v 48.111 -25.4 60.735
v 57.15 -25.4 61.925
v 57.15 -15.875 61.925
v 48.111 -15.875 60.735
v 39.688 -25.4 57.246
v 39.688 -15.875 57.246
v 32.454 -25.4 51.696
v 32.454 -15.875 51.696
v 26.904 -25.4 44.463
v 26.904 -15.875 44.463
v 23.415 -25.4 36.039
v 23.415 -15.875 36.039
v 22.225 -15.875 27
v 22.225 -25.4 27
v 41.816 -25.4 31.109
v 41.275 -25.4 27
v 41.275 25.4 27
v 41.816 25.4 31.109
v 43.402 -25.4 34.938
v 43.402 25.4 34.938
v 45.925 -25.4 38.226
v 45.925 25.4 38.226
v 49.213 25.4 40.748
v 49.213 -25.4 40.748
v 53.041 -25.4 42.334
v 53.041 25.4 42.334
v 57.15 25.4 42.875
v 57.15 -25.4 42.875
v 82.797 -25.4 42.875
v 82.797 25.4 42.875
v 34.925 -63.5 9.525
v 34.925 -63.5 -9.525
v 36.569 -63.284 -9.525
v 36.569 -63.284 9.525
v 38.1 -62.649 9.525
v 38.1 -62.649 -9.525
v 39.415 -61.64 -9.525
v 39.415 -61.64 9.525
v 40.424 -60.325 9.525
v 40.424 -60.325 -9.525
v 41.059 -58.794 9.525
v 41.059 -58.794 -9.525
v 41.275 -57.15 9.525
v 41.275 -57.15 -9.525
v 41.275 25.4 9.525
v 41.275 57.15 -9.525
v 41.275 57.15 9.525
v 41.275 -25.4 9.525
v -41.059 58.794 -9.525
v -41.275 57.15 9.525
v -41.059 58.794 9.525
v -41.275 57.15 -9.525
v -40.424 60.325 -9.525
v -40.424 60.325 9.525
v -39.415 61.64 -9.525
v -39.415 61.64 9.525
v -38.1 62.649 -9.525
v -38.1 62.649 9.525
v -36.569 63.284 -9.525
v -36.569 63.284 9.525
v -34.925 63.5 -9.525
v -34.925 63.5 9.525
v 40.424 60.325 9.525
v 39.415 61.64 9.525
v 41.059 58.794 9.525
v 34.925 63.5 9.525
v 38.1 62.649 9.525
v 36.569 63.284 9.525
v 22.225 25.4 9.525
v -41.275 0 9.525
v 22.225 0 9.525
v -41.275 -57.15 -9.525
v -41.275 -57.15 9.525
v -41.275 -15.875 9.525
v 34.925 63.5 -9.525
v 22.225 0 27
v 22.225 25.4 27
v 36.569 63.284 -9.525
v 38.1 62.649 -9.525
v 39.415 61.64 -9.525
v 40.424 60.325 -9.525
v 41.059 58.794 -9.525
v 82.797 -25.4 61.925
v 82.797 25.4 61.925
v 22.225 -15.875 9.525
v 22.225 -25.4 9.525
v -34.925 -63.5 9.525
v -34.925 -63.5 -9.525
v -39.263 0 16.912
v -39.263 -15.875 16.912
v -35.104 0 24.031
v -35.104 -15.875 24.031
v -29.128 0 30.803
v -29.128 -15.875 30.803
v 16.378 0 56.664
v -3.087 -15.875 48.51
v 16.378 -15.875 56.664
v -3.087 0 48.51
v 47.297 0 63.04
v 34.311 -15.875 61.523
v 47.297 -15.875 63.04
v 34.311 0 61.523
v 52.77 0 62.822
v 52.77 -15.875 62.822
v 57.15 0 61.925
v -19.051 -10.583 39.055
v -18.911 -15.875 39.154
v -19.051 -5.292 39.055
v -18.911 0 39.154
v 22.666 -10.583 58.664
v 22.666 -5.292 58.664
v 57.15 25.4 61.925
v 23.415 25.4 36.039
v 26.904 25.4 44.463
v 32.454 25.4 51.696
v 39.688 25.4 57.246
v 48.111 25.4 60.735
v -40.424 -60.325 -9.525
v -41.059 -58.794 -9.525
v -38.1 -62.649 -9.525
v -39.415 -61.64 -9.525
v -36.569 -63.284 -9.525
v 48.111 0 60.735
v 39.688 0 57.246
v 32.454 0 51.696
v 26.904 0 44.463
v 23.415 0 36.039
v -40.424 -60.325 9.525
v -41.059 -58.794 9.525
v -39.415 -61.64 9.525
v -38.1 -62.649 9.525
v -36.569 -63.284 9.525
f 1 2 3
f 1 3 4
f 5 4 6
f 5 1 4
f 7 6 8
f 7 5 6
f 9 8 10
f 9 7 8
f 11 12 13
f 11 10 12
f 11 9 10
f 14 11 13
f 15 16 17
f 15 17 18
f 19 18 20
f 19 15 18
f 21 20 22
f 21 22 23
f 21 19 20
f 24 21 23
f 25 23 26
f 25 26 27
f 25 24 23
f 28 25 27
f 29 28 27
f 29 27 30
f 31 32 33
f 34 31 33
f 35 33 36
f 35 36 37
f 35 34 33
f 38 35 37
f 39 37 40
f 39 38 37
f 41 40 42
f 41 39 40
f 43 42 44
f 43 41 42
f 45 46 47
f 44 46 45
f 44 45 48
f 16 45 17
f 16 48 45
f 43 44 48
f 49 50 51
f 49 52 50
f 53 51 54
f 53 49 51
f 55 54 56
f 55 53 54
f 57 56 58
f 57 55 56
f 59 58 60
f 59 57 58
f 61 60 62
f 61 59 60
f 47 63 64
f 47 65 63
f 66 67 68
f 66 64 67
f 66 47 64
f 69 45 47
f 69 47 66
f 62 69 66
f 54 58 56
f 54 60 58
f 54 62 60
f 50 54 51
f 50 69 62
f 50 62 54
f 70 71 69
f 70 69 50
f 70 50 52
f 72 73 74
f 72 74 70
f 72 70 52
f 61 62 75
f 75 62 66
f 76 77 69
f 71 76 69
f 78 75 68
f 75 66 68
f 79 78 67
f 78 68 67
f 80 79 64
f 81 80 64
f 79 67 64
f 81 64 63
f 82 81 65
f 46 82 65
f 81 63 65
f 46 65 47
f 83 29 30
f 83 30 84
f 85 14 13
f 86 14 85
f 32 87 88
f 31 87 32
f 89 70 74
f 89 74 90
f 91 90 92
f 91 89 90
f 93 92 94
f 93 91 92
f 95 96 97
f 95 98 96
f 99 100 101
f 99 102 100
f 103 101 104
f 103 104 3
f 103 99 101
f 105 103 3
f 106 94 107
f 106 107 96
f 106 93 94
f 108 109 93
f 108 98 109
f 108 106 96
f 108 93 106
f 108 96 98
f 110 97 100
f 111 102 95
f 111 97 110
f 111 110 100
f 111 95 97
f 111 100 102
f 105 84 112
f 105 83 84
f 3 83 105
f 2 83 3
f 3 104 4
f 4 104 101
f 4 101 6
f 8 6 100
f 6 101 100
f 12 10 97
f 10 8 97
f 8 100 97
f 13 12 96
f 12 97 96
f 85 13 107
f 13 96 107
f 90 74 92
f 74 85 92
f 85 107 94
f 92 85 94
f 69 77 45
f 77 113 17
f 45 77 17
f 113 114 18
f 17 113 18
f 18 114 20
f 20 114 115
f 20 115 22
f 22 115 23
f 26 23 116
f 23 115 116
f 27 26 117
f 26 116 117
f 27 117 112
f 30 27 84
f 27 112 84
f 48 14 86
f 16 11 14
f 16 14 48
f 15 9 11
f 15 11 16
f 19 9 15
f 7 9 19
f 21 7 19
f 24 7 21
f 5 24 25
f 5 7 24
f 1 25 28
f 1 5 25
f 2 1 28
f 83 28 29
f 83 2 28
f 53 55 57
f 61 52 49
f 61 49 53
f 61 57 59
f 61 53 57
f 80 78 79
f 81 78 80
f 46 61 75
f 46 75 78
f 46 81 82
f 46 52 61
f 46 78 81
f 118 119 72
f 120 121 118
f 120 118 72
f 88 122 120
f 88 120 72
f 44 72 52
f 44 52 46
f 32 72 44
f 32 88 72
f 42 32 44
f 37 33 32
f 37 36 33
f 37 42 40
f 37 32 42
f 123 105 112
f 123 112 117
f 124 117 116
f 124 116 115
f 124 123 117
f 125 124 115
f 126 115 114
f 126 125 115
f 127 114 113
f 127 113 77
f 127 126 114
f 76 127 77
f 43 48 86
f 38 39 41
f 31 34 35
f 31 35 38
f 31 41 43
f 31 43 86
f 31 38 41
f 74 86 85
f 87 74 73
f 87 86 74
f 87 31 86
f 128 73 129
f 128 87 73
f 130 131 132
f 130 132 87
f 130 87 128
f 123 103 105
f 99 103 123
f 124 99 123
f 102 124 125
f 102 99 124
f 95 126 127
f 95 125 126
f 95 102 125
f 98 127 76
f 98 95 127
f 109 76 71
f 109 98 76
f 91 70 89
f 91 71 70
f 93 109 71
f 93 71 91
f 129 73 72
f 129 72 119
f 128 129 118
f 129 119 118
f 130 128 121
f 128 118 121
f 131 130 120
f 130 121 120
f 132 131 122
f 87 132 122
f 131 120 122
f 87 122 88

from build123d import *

# Parameters (mm, degrees)
F1_DEPTH = 63.5
F0_W     = 22.4716843884
F0_H     = 19.05
F2_DEPTH = 25.4
F3_DEPTH = 15.875
F5_R     = 6.35


# Not quite as in the source:
# - the program builds the solid bodies; features that only make, move or delete a surface that nothing else refers to are left out


with BuildPart() as f1:
    # F0 (on Front) → F1 (new body, symmetric)
    with BuildSketch(Plane.XZ):
        Polygon((22.225, 9.525), (-41.275, 9.525), (-41.275, -9.525), (41.275, -9.525), (41.275, 9.525), align=None)
    extrude(amount=F1_DEPTH, both=True)

    # F0 (on Front) → F2 (join, symmetric)
    with BuildSketch(Plane.XZ):
        with BuildLine():
            Line((22.225, 27.0002), (22.225, 9.525))
            Line((22.225, 9.525), (41.275, 9.525))
            Line((41.275, 9.525), (41.275, 27.0002))
            ThreePointArc((41.275, 27.0002), (45.9246798487, 38.2255201513), (57.15, 42.8752))
            Line((57.15, 42.8752), (60.325, 42.8752))
            Line((60.325, 42.8752), (60.325, 61.9252))
            Line((60.325, 61.9252), (57.15, 61.9252))
            ThreePointArc((57.15, 61.9252), (32.4542956671, 51.6959043329), (22.225, 27.0002))
        make_face()
        with Locations((71.5608421942, 52.4002)):
            Rectangle(F0_W, F0_H)
    extrude(amount=F2_DEPTH, both=True)

    # F0 (on Front) → F3 (join)
    with BuildSketch(Plane.XZ):
        with BuildLine():
            add(Edge.make_bspline(
                [(-41.275, 9.525), (-37.7052687109, 41.8739132583), (35.1902469993, 68.9807906747), (57.15, 61.9252)],
                knots=[0, 0, 0, 0, 111.5045361635, 111.5045361635, 111.5045361635, 111.5045361635], degree=3))
            Line((-41.275, 9.525), (22.225, 9.525))
            Line((22.225, 9.525), (22.225, 27.0002))
            ThreePointArc((22.225, 27.0002), (32.4542956671, 51.6959043329), (57.15, 61.9252))
        make_face()
    extrude(amount=F3_DEPTH)

    # F5
    f5_edges = [f1.edges().sort_by_distance(p)[0] for p in [
        (41.275, -63.5, 0),
        (-41.275, -63.5, 0),
        (-41.275, 63.5, 0),
        (41.275, 63.5, 0),
    ]]
    fillet(f5_edges, radius=F5_R)


solid = f1.part
